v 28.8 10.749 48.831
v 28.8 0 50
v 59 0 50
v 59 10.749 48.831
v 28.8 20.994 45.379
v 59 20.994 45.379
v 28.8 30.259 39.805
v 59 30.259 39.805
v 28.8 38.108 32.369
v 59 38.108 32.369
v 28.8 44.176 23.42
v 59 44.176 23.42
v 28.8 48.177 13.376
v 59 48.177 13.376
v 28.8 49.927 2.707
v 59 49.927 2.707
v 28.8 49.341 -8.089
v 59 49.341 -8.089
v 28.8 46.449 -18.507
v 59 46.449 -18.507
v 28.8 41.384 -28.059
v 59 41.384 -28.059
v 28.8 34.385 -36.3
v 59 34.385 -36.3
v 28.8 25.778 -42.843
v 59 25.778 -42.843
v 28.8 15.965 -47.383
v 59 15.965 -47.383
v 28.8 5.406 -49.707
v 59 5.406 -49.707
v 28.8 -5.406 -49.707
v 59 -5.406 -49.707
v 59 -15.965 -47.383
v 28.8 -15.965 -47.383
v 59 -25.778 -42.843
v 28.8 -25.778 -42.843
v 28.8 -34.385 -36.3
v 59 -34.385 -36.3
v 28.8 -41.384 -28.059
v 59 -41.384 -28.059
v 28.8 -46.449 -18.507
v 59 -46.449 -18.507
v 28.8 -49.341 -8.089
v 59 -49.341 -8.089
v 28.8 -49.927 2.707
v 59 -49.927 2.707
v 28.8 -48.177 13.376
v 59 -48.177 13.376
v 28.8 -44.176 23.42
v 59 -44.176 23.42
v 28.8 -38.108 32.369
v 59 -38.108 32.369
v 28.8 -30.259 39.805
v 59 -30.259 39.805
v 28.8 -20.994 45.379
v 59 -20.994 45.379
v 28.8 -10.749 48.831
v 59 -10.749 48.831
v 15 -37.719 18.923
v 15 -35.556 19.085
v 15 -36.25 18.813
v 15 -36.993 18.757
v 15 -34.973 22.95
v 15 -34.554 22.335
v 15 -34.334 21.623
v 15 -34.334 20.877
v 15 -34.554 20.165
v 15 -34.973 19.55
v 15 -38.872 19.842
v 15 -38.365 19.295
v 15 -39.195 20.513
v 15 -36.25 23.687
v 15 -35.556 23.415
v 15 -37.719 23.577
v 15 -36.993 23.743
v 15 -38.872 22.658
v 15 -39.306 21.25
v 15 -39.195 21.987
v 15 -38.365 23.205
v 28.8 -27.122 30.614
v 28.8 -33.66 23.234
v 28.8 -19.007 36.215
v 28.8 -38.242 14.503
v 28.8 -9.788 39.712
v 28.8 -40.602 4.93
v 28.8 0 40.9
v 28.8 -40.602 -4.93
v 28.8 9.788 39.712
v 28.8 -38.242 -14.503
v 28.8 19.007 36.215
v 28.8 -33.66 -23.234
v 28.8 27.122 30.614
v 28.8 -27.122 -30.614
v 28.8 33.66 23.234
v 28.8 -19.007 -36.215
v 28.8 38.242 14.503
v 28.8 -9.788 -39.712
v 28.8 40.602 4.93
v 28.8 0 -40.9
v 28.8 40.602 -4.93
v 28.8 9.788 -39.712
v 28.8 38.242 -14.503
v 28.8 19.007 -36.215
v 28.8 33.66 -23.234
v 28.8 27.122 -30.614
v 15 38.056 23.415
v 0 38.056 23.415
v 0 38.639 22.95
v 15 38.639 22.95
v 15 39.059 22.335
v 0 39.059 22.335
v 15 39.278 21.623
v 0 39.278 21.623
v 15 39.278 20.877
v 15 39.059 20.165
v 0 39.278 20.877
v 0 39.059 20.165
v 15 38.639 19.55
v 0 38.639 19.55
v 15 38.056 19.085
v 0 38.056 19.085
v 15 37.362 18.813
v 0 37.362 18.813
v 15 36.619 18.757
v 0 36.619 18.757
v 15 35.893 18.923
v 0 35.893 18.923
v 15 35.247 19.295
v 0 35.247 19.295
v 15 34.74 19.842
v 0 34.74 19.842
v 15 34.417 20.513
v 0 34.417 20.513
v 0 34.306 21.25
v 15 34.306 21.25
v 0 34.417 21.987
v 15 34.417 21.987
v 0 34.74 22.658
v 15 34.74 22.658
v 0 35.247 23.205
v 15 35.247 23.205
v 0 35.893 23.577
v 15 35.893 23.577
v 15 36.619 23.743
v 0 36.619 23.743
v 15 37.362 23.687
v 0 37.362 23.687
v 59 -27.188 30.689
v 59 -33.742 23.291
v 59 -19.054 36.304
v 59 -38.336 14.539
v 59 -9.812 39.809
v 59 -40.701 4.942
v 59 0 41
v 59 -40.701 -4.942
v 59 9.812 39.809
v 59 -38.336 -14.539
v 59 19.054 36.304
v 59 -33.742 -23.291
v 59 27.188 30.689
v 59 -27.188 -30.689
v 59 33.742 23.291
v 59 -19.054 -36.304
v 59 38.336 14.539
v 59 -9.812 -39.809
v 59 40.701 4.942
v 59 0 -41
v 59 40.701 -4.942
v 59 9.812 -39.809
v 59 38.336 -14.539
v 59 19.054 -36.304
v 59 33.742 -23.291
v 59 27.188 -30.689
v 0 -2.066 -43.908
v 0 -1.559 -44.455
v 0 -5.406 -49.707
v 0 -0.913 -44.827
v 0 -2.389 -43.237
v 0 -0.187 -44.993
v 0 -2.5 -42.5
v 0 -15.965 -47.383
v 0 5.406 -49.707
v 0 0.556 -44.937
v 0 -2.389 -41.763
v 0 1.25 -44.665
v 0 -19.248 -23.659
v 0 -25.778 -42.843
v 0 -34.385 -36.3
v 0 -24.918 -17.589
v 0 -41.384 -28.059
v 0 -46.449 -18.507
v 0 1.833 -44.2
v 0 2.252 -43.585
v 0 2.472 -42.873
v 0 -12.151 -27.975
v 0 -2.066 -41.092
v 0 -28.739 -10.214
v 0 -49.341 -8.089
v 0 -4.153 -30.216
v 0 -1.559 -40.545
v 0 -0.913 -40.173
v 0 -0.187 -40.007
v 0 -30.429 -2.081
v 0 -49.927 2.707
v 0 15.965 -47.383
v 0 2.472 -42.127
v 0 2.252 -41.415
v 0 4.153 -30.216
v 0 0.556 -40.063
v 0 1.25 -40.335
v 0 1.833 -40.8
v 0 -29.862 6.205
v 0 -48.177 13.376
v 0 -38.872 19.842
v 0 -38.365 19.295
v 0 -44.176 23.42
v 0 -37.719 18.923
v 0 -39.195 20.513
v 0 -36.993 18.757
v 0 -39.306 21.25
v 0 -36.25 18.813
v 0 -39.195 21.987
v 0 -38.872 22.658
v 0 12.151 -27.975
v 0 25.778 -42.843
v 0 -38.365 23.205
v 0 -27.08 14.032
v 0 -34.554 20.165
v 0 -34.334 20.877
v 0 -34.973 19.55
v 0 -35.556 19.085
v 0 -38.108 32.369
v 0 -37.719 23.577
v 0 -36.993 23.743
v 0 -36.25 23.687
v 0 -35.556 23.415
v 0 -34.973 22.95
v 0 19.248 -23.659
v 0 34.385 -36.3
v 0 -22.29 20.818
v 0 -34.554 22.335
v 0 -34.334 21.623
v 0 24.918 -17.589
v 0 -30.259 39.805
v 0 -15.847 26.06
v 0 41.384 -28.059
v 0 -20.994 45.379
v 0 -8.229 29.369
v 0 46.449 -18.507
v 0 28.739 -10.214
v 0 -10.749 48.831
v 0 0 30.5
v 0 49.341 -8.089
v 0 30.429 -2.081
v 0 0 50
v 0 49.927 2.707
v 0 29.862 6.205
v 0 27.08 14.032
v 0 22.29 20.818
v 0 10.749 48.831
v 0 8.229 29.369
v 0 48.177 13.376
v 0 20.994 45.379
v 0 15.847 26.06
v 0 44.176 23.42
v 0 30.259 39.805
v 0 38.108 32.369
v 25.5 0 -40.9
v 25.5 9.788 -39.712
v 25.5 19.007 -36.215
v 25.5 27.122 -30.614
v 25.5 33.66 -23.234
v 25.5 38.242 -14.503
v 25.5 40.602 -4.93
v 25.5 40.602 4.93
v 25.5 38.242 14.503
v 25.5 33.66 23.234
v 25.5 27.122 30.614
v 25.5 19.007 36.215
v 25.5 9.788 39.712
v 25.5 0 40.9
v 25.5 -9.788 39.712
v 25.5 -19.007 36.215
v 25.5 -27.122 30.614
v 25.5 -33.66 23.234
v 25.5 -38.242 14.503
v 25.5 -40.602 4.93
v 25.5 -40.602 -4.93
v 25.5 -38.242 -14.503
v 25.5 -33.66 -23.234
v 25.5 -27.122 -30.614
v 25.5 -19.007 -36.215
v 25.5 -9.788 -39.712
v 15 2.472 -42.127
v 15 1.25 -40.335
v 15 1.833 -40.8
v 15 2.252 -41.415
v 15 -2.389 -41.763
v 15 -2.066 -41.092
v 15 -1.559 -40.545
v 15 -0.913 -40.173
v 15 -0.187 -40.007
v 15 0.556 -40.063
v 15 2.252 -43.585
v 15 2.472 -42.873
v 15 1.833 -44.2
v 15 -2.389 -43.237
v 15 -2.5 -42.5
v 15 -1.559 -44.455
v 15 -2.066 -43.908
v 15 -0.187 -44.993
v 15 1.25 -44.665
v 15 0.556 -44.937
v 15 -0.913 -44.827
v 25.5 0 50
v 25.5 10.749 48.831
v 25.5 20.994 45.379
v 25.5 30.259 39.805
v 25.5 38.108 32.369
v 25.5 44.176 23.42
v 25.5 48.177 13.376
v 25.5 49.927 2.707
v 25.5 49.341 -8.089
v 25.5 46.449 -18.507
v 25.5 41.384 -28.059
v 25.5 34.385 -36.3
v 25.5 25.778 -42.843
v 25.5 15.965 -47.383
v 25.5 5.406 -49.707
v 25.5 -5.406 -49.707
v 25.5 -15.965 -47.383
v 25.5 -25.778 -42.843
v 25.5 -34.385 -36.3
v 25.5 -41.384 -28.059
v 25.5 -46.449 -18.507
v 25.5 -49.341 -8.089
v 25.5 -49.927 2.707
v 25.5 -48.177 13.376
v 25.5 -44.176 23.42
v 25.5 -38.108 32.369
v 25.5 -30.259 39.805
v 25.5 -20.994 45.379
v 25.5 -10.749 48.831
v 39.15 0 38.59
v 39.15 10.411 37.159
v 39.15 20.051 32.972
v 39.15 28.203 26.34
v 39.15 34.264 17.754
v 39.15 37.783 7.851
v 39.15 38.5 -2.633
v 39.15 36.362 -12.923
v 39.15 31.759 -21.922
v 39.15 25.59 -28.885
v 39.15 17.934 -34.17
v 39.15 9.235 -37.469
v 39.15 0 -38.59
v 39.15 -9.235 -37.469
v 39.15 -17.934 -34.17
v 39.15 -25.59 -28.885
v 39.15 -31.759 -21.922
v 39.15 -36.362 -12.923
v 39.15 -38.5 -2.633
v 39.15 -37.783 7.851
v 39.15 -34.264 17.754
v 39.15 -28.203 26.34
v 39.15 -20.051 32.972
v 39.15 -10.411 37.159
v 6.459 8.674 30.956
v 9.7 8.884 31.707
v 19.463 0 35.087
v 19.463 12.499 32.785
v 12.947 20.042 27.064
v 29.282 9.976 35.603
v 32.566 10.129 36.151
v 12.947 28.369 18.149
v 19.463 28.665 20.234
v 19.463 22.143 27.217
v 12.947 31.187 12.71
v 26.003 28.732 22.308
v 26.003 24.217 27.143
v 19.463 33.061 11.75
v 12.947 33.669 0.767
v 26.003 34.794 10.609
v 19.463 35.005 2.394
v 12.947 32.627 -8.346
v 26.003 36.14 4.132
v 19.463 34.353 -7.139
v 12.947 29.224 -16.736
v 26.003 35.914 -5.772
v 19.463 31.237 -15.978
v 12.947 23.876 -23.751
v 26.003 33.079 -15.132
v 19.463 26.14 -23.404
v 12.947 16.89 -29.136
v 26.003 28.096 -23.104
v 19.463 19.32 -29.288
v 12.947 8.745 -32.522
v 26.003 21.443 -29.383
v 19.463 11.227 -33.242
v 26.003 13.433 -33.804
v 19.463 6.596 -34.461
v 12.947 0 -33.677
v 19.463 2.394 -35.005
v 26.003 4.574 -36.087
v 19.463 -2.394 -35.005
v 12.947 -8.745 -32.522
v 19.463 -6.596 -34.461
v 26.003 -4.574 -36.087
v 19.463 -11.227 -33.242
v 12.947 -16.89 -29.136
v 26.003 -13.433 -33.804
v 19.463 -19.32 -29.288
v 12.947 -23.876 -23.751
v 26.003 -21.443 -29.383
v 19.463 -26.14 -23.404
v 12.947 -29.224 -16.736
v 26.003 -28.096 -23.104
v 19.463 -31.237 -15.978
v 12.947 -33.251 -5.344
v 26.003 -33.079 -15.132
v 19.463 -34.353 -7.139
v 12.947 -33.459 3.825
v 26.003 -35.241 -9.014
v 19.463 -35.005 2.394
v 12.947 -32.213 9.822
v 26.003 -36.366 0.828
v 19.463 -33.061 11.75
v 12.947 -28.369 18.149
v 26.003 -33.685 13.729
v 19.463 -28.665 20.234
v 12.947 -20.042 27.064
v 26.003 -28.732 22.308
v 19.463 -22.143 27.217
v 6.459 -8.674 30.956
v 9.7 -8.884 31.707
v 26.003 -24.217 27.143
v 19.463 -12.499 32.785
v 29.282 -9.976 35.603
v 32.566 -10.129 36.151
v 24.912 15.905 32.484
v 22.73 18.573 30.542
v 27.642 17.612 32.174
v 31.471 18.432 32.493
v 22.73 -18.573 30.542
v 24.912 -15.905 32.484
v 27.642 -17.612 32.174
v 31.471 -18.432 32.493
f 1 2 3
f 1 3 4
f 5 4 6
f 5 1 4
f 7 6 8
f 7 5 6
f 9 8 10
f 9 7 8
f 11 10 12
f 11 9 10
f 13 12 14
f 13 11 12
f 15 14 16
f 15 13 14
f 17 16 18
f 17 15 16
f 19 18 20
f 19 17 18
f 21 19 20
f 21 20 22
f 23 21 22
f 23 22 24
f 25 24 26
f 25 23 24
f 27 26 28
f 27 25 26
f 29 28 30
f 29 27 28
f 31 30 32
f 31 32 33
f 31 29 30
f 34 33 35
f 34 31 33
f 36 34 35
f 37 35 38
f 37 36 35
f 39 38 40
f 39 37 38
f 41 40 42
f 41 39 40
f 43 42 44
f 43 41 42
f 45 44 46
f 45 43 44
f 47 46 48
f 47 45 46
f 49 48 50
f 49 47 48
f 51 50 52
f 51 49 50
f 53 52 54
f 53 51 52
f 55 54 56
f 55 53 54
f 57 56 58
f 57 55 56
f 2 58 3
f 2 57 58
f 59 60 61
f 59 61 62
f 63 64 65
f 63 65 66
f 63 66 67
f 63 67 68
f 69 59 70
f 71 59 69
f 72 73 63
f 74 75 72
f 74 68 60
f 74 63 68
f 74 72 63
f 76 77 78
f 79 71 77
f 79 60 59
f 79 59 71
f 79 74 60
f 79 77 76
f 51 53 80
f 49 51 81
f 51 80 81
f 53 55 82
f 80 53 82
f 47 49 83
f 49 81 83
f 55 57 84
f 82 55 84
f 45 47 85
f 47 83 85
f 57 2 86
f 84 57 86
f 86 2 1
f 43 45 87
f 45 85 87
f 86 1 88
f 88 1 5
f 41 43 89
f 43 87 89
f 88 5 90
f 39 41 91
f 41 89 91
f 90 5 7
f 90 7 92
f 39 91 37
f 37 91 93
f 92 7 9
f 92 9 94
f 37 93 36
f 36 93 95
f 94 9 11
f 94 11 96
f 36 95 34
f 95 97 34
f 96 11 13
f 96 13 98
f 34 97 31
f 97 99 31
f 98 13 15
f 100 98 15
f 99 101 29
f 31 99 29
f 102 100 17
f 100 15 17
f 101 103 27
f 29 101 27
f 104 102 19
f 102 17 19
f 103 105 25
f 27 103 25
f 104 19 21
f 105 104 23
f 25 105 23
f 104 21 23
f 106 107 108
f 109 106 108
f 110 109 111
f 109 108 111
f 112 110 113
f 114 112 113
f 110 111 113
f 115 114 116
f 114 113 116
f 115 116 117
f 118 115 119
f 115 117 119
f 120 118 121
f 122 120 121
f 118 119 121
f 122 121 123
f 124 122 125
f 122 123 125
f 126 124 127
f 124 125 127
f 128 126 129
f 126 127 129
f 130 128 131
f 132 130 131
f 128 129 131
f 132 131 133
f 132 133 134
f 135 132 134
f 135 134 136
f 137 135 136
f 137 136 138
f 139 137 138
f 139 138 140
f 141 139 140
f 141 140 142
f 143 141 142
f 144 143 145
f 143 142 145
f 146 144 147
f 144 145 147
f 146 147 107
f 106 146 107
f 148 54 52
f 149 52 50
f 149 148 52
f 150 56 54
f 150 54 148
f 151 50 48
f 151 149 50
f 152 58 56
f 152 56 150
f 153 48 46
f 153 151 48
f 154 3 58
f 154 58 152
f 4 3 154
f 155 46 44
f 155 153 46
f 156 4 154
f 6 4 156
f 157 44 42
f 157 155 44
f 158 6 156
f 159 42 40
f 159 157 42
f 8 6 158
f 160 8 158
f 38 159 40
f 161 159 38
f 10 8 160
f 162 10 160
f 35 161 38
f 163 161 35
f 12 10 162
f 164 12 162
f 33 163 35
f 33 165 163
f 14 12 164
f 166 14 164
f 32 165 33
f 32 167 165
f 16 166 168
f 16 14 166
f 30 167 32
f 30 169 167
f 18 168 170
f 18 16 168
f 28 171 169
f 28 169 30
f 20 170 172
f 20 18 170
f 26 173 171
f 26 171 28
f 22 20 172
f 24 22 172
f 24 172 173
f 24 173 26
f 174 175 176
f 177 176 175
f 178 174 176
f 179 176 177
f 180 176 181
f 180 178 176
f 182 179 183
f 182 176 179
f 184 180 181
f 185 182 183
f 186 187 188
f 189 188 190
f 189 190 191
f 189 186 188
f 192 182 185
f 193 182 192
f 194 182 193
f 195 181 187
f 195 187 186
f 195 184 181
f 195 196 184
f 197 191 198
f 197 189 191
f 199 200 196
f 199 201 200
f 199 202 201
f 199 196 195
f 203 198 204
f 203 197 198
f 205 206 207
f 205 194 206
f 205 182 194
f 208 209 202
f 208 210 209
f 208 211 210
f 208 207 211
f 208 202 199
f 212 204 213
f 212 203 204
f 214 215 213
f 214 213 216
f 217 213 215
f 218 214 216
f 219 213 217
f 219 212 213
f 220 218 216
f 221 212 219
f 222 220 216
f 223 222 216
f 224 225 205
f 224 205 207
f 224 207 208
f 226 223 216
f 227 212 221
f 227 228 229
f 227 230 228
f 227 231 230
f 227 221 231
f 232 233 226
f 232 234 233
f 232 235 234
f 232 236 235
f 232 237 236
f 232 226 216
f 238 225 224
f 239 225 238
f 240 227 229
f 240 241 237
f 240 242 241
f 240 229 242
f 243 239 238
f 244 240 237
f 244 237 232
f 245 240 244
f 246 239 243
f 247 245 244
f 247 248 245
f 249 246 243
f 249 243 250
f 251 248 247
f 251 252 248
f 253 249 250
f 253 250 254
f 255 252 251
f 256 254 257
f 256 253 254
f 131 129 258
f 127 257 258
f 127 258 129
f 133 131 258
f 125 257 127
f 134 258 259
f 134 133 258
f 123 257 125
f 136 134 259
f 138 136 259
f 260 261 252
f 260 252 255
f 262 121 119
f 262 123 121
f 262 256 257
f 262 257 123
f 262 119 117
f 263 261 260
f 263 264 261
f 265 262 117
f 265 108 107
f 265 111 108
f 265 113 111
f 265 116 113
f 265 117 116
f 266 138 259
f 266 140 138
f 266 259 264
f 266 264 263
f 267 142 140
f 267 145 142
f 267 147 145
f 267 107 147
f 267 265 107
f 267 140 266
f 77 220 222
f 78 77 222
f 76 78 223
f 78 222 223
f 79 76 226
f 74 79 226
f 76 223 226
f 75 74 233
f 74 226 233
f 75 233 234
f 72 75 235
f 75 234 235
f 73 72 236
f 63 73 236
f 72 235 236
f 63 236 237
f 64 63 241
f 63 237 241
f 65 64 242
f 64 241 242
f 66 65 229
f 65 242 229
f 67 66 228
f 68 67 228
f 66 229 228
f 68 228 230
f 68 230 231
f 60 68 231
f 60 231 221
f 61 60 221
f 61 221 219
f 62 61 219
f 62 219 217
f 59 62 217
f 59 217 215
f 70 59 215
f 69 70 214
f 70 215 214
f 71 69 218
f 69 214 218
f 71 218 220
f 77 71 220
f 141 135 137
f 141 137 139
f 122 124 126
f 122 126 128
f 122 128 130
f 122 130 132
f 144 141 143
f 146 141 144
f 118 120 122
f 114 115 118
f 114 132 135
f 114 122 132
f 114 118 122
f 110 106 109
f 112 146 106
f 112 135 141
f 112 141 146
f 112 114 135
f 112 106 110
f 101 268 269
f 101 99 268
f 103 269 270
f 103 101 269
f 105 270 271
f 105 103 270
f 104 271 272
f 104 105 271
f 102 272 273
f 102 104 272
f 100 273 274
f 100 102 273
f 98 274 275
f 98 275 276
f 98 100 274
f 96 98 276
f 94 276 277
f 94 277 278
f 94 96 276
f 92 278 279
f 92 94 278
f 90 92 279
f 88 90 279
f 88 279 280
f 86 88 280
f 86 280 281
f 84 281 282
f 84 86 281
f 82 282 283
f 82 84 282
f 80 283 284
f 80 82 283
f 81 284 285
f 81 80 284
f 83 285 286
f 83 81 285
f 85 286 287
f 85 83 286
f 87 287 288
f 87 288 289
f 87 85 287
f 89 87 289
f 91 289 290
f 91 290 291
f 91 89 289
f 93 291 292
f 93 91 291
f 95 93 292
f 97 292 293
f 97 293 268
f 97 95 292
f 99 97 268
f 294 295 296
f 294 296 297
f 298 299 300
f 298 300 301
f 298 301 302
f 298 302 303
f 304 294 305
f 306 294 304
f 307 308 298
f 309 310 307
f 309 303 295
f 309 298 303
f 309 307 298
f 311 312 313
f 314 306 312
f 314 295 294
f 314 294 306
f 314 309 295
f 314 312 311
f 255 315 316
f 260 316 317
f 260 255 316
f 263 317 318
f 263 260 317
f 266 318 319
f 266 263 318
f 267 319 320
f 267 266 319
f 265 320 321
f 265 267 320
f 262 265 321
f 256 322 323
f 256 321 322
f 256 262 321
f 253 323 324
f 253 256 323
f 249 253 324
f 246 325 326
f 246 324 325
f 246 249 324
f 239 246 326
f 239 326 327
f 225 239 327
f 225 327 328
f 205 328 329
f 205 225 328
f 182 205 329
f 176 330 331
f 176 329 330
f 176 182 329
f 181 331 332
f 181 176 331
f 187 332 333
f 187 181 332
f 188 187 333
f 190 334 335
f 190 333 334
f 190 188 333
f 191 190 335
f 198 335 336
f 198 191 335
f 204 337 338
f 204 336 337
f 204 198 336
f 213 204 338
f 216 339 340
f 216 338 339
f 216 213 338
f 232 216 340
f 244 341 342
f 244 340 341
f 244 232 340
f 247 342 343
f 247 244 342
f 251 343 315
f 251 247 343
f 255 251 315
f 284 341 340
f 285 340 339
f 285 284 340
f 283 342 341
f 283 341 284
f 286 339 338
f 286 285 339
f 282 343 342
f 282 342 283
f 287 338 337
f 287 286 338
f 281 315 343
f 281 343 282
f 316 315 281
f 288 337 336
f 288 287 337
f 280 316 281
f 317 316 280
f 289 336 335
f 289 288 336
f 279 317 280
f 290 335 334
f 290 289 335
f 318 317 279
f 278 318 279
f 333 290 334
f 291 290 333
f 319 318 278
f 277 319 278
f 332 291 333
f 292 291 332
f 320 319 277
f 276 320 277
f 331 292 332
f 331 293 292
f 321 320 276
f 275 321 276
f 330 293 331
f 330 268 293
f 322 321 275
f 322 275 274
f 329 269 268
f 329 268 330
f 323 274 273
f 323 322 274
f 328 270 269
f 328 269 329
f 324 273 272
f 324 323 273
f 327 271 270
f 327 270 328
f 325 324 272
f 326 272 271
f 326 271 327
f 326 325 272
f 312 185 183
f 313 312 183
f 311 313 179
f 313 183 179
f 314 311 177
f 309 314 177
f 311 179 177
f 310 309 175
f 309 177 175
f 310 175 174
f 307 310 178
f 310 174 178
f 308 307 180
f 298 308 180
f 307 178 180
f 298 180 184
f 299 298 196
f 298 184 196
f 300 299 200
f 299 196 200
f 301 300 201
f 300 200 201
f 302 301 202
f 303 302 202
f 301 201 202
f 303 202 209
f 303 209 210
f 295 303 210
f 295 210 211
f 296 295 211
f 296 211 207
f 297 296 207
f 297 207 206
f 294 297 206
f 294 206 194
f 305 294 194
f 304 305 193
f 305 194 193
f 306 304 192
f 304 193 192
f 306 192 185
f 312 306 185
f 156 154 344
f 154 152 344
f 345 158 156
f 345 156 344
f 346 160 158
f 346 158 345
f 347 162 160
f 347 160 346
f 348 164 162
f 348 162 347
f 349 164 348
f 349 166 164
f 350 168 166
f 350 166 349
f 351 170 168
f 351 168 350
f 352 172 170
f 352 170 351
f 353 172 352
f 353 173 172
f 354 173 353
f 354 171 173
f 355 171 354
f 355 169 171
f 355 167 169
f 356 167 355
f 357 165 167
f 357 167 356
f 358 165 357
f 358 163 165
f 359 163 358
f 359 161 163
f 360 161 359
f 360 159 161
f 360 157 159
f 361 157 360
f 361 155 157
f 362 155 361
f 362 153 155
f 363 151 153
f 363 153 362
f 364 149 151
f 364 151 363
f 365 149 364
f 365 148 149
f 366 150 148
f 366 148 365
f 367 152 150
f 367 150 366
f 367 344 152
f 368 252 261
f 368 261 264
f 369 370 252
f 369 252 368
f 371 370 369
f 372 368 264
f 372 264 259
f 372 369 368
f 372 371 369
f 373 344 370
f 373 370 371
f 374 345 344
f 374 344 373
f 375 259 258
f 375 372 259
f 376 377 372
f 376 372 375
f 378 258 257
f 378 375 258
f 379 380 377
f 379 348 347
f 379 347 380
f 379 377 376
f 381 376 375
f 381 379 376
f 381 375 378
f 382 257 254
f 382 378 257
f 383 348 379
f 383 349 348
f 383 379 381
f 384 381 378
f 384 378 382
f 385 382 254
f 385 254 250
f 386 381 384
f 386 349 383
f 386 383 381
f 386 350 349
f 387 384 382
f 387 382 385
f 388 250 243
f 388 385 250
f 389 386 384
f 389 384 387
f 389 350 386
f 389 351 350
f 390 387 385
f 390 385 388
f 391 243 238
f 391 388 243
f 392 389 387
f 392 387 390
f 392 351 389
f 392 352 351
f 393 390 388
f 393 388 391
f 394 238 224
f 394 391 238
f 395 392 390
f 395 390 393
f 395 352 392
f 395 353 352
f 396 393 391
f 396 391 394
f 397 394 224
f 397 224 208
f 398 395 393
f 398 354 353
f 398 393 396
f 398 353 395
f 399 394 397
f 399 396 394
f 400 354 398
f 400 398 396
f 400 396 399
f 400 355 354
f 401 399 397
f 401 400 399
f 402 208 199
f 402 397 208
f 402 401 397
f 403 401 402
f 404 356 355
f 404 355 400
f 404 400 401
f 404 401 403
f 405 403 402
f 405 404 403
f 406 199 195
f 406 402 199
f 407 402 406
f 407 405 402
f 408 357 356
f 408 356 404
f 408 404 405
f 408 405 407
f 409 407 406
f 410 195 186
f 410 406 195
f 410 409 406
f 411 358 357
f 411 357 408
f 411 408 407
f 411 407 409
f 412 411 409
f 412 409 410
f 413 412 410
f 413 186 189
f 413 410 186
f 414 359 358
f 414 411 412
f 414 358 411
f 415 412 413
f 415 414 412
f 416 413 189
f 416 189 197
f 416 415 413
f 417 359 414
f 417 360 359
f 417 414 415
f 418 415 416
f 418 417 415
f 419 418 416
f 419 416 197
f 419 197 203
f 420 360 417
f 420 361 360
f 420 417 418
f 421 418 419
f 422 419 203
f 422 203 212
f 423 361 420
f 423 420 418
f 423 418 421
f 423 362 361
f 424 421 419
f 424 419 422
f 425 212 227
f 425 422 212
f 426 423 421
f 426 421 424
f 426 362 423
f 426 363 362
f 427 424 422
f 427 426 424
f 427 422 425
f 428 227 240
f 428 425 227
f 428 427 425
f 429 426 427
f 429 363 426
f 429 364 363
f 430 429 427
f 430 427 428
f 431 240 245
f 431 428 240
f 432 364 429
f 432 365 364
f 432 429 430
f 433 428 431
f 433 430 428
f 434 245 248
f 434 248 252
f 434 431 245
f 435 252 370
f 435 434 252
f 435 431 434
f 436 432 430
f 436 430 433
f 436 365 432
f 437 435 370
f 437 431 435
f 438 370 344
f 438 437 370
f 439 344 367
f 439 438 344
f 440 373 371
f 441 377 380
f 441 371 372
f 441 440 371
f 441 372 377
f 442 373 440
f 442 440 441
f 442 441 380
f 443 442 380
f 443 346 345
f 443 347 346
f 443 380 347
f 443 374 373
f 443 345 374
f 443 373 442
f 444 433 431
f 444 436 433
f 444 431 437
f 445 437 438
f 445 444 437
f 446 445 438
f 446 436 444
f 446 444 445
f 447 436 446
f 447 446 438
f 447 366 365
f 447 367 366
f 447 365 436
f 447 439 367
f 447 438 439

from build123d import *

# Parameters (mm, degrees)
F2_R            = 2.5
F3_DEPTH        = 15
F3_COPIES_COUNT = 3
F4_W            = 3.3
F4_H            = 9.1


# Not quite as in the source:
# - a pattern or mirror of a feature is missing from the dataset's text; its kind, count and spacing are read off the source's solid


with BuildPart() as f1:
    # F0 (on Front) → F1 (revolve)
    with BuildSketch(Plane.XZ):
        with BuildLine():
            Line((59, 50), (0, 50))
            Line((0, 50), (0, 30.5))
            ThreePointArc((0, 30.5), (29.2820901792, 36.97444566), (59, 41))
            Line((59, 41), (59, 50))
        make_face()
    revolve(axis=Axis((-28.7704151153, 0, 0), (-1, 0, 0)))

    # F2 (on face) → F3 (cut)
    with BuildSketch(Plane(origin=(0, 0, 0), x_dir=(0, -1, 0), z_dir=(-1, 0, 0))):
        with Locations((36.8060796608, 21.25)):
            Circle(F2_R)
    f3 = extrude(amount=-F3_DEPTH, mode=Mode.SUBTRACT)

    # F3_copies: F3 ×3 about axis
    f3_copies_axis = Axis((0, 0, 0), (1, 0, 0))
    for i in range(1, F3_COPIES_COUNT):
        add(f3.rotate(f3_copies_axis, i * 360 / F3_COPIES_COUNT), mode=Mode.SUBTRACT)

    # F4 (on Front) → F5 (revolve, cut)
    with BuildSketch(Plane.XZ):
        with Locations((27.15, -45.45)):
            Rectangle(F4_W, F4_H)
    revolve(axis=Axis((25.2881273627, 0, 0), (1, 0, 0)), mode=Mode.SUBTRACT)


solid = f1.part
